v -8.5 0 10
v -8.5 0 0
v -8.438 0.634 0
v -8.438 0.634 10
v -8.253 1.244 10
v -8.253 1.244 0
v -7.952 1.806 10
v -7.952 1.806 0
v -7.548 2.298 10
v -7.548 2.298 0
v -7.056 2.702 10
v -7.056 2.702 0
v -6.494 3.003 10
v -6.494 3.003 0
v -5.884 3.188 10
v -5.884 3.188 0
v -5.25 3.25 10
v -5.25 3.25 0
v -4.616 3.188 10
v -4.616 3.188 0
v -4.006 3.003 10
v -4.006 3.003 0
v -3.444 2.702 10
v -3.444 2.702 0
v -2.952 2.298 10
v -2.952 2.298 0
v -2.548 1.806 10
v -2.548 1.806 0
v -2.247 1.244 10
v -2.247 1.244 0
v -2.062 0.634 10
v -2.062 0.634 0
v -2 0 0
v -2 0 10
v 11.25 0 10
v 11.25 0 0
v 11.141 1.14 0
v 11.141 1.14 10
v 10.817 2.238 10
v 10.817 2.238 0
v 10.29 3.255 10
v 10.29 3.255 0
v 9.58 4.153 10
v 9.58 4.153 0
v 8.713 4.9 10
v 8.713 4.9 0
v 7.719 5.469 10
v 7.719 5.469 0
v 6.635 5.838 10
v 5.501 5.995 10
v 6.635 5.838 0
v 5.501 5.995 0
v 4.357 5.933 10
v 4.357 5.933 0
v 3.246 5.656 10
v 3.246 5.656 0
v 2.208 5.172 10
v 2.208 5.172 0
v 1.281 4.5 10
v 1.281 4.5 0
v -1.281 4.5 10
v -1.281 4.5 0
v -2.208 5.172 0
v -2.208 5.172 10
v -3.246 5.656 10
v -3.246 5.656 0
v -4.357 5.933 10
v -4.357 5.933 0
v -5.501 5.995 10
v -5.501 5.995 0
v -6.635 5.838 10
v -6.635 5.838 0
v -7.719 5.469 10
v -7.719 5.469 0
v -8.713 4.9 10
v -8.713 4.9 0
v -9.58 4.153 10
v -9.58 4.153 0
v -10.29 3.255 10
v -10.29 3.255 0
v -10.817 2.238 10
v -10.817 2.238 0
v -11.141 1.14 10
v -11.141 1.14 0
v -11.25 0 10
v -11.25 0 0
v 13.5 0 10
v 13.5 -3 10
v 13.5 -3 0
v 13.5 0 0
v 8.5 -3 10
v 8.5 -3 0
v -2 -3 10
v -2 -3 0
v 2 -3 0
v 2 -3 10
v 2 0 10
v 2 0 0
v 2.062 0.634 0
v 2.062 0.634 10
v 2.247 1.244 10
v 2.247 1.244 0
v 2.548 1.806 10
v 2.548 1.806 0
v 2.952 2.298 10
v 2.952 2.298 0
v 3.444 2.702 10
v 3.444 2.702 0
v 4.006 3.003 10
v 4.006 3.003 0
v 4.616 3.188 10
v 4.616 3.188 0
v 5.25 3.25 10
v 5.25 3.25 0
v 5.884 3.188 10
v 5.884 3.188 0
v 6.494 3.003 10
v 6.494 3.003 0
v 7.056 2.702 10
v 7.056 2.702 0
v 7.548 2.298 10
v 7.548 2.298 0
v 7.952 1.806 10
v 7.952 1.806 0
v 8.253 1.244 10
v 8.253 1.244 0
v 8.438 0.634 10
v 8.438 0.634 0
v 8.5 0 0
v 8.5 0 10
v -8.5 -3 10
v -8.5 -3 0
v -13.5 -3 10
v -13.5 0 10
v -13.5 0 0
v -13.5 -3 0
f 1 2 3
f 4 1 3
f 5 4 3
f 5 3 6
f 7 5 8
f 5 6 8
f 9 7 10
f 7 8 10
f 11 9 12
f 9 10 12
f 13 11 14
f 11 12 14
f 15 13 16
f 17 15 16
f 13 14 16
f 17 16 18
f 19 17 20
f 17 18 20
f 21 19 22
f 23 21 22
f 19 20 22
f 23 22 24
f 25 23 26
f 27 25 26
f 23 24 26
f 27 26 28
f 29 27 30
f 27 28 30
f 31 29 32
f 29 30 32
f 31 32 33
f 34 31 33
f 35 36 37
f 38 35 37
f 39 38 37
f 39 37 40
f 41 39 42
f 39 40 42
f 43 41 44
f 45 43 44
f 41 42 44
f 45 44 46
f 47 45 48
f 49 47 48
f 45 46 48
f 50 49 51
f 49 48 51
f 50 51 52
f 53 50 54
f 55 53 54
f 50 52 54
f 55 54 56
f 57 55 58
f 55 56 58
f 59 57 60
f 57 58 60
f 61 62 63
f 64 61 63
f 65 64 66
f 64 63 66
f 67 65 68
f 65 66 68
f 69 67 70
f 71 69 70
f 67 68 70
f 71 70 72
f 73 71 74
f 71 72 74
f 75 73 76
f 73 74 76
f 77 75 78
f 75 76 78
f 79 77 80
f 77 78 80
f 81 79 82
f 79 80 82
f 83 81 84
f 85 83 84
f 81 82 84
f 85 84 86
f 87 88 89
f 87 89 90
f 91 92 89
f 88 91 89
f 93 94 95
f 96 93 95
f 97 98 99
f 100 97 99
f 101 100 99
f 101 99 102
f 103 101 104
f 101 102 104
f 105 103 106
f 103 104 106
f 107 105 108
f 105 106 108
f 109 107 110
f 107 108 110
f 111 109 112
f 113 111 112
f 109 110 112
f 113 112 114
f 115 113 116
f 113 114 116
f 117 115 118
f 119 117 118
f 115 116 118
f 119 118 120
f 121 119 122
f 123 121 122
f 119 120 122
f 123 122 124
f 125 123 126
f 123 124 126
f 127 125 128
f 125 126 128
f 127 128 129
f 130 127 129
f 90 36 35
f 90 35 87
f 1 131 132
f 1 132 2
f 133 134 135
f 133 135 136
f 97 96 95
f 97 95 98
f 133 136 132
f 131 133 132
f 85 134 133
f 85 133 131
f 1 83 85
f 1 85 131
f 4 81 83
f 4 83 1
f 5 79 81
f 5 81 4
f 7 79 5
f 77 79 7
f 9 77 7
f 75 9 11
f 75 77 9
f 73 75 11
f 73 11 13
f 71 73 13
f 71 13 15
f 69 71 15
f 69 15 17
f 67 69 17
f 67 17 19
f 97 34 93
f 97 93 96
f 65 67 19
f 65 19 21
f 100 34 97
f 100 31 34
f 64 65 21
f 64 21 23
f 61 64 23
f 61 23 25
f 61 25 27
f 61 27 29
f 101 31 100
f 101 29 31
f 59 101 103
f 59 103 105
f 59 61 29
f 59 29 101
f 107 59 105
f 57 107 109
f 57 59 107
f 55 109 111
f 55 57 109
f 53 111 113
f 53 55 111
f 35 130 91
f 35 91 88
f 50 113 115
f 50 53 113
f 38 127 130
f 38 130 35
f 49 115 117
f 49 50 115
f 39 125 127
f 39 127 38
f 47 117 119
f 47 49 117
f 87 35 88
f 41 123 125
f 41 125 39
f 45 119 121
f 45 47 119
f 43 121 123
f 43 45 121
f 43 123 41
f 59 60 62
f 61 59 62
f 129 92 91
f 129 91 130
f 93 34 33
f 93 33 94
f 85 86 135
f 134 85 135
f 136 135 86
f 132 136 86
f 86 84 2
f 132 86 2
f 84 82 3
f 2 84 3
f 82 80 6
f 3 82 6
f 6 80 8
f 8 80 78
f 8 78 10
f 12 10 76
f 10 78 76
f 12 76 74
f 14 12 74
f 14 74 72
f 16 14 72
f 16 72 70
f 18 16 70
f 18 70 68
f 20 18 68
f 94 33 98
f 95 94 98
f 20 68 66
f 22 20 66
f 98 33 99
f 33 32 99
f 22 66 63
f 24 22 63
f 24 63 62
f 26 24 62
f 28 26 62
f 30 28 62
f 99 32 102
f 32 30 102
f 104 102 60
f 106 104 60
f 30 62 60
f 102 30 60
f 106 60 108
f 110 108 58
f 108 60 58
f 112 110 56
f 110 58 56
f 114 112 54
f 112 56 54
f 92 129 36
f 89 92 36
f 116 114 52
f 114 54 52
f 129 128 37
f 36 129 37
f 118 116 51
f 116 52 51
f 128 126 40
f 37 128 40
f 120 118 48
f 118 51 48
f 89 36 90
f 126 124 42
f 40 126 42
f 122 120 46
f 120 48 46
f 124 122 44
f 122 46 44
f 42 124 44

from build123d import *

# Parameters (mm, degrees)
SKETCH1_W           = 5
SKETCH1_H           = 3
BOSS_EXTRUDE1_DEPTH = 10


with BuildPart() as part:
    # Sketch1 → Boss-Extrude1 (new body)
    with BuildSketch(Plane.XY):
        with BuildLine():
            ThreePointArc((2, 0), (5.25, 3.25), (8.5, 0))
            Line((8.5, 0), (11.25, 0))
            ThreePointArc((11.25, 0), (7.718626967, 5.468626967), (1.281373033, 4.5))
            Line((1.281373033, 4.5), (-1.281373033, 4.5))
            ThreePointArc((-1.281373033, 4.5), (-7.718626967, 5.468626967), (-11.25, 0))
            Line((-11.25, 0), (-13.5, 0))
            Line((-13.5, 0), (-13.5, -3))
            Line((-13.5, -3), (-8.5, -3))
            Line((-8.5, -3), (-8.5, 0))
            ThreePointArc((-8.5, 0), (-5.25, 3.25), (-2, 0))
            Line((-2, 0), (-2, -3))
            Line((-2, -3), (2, -3))
            Line((2, -3), (2, 0))
        make_face()
        with Locations((11, -1.5)):
            Rectangle(SKETCH1_W, SKETCH1_H)
    extrude(amount=BOSS_EXTRUDE1_DEPTH)


solid = part.part
